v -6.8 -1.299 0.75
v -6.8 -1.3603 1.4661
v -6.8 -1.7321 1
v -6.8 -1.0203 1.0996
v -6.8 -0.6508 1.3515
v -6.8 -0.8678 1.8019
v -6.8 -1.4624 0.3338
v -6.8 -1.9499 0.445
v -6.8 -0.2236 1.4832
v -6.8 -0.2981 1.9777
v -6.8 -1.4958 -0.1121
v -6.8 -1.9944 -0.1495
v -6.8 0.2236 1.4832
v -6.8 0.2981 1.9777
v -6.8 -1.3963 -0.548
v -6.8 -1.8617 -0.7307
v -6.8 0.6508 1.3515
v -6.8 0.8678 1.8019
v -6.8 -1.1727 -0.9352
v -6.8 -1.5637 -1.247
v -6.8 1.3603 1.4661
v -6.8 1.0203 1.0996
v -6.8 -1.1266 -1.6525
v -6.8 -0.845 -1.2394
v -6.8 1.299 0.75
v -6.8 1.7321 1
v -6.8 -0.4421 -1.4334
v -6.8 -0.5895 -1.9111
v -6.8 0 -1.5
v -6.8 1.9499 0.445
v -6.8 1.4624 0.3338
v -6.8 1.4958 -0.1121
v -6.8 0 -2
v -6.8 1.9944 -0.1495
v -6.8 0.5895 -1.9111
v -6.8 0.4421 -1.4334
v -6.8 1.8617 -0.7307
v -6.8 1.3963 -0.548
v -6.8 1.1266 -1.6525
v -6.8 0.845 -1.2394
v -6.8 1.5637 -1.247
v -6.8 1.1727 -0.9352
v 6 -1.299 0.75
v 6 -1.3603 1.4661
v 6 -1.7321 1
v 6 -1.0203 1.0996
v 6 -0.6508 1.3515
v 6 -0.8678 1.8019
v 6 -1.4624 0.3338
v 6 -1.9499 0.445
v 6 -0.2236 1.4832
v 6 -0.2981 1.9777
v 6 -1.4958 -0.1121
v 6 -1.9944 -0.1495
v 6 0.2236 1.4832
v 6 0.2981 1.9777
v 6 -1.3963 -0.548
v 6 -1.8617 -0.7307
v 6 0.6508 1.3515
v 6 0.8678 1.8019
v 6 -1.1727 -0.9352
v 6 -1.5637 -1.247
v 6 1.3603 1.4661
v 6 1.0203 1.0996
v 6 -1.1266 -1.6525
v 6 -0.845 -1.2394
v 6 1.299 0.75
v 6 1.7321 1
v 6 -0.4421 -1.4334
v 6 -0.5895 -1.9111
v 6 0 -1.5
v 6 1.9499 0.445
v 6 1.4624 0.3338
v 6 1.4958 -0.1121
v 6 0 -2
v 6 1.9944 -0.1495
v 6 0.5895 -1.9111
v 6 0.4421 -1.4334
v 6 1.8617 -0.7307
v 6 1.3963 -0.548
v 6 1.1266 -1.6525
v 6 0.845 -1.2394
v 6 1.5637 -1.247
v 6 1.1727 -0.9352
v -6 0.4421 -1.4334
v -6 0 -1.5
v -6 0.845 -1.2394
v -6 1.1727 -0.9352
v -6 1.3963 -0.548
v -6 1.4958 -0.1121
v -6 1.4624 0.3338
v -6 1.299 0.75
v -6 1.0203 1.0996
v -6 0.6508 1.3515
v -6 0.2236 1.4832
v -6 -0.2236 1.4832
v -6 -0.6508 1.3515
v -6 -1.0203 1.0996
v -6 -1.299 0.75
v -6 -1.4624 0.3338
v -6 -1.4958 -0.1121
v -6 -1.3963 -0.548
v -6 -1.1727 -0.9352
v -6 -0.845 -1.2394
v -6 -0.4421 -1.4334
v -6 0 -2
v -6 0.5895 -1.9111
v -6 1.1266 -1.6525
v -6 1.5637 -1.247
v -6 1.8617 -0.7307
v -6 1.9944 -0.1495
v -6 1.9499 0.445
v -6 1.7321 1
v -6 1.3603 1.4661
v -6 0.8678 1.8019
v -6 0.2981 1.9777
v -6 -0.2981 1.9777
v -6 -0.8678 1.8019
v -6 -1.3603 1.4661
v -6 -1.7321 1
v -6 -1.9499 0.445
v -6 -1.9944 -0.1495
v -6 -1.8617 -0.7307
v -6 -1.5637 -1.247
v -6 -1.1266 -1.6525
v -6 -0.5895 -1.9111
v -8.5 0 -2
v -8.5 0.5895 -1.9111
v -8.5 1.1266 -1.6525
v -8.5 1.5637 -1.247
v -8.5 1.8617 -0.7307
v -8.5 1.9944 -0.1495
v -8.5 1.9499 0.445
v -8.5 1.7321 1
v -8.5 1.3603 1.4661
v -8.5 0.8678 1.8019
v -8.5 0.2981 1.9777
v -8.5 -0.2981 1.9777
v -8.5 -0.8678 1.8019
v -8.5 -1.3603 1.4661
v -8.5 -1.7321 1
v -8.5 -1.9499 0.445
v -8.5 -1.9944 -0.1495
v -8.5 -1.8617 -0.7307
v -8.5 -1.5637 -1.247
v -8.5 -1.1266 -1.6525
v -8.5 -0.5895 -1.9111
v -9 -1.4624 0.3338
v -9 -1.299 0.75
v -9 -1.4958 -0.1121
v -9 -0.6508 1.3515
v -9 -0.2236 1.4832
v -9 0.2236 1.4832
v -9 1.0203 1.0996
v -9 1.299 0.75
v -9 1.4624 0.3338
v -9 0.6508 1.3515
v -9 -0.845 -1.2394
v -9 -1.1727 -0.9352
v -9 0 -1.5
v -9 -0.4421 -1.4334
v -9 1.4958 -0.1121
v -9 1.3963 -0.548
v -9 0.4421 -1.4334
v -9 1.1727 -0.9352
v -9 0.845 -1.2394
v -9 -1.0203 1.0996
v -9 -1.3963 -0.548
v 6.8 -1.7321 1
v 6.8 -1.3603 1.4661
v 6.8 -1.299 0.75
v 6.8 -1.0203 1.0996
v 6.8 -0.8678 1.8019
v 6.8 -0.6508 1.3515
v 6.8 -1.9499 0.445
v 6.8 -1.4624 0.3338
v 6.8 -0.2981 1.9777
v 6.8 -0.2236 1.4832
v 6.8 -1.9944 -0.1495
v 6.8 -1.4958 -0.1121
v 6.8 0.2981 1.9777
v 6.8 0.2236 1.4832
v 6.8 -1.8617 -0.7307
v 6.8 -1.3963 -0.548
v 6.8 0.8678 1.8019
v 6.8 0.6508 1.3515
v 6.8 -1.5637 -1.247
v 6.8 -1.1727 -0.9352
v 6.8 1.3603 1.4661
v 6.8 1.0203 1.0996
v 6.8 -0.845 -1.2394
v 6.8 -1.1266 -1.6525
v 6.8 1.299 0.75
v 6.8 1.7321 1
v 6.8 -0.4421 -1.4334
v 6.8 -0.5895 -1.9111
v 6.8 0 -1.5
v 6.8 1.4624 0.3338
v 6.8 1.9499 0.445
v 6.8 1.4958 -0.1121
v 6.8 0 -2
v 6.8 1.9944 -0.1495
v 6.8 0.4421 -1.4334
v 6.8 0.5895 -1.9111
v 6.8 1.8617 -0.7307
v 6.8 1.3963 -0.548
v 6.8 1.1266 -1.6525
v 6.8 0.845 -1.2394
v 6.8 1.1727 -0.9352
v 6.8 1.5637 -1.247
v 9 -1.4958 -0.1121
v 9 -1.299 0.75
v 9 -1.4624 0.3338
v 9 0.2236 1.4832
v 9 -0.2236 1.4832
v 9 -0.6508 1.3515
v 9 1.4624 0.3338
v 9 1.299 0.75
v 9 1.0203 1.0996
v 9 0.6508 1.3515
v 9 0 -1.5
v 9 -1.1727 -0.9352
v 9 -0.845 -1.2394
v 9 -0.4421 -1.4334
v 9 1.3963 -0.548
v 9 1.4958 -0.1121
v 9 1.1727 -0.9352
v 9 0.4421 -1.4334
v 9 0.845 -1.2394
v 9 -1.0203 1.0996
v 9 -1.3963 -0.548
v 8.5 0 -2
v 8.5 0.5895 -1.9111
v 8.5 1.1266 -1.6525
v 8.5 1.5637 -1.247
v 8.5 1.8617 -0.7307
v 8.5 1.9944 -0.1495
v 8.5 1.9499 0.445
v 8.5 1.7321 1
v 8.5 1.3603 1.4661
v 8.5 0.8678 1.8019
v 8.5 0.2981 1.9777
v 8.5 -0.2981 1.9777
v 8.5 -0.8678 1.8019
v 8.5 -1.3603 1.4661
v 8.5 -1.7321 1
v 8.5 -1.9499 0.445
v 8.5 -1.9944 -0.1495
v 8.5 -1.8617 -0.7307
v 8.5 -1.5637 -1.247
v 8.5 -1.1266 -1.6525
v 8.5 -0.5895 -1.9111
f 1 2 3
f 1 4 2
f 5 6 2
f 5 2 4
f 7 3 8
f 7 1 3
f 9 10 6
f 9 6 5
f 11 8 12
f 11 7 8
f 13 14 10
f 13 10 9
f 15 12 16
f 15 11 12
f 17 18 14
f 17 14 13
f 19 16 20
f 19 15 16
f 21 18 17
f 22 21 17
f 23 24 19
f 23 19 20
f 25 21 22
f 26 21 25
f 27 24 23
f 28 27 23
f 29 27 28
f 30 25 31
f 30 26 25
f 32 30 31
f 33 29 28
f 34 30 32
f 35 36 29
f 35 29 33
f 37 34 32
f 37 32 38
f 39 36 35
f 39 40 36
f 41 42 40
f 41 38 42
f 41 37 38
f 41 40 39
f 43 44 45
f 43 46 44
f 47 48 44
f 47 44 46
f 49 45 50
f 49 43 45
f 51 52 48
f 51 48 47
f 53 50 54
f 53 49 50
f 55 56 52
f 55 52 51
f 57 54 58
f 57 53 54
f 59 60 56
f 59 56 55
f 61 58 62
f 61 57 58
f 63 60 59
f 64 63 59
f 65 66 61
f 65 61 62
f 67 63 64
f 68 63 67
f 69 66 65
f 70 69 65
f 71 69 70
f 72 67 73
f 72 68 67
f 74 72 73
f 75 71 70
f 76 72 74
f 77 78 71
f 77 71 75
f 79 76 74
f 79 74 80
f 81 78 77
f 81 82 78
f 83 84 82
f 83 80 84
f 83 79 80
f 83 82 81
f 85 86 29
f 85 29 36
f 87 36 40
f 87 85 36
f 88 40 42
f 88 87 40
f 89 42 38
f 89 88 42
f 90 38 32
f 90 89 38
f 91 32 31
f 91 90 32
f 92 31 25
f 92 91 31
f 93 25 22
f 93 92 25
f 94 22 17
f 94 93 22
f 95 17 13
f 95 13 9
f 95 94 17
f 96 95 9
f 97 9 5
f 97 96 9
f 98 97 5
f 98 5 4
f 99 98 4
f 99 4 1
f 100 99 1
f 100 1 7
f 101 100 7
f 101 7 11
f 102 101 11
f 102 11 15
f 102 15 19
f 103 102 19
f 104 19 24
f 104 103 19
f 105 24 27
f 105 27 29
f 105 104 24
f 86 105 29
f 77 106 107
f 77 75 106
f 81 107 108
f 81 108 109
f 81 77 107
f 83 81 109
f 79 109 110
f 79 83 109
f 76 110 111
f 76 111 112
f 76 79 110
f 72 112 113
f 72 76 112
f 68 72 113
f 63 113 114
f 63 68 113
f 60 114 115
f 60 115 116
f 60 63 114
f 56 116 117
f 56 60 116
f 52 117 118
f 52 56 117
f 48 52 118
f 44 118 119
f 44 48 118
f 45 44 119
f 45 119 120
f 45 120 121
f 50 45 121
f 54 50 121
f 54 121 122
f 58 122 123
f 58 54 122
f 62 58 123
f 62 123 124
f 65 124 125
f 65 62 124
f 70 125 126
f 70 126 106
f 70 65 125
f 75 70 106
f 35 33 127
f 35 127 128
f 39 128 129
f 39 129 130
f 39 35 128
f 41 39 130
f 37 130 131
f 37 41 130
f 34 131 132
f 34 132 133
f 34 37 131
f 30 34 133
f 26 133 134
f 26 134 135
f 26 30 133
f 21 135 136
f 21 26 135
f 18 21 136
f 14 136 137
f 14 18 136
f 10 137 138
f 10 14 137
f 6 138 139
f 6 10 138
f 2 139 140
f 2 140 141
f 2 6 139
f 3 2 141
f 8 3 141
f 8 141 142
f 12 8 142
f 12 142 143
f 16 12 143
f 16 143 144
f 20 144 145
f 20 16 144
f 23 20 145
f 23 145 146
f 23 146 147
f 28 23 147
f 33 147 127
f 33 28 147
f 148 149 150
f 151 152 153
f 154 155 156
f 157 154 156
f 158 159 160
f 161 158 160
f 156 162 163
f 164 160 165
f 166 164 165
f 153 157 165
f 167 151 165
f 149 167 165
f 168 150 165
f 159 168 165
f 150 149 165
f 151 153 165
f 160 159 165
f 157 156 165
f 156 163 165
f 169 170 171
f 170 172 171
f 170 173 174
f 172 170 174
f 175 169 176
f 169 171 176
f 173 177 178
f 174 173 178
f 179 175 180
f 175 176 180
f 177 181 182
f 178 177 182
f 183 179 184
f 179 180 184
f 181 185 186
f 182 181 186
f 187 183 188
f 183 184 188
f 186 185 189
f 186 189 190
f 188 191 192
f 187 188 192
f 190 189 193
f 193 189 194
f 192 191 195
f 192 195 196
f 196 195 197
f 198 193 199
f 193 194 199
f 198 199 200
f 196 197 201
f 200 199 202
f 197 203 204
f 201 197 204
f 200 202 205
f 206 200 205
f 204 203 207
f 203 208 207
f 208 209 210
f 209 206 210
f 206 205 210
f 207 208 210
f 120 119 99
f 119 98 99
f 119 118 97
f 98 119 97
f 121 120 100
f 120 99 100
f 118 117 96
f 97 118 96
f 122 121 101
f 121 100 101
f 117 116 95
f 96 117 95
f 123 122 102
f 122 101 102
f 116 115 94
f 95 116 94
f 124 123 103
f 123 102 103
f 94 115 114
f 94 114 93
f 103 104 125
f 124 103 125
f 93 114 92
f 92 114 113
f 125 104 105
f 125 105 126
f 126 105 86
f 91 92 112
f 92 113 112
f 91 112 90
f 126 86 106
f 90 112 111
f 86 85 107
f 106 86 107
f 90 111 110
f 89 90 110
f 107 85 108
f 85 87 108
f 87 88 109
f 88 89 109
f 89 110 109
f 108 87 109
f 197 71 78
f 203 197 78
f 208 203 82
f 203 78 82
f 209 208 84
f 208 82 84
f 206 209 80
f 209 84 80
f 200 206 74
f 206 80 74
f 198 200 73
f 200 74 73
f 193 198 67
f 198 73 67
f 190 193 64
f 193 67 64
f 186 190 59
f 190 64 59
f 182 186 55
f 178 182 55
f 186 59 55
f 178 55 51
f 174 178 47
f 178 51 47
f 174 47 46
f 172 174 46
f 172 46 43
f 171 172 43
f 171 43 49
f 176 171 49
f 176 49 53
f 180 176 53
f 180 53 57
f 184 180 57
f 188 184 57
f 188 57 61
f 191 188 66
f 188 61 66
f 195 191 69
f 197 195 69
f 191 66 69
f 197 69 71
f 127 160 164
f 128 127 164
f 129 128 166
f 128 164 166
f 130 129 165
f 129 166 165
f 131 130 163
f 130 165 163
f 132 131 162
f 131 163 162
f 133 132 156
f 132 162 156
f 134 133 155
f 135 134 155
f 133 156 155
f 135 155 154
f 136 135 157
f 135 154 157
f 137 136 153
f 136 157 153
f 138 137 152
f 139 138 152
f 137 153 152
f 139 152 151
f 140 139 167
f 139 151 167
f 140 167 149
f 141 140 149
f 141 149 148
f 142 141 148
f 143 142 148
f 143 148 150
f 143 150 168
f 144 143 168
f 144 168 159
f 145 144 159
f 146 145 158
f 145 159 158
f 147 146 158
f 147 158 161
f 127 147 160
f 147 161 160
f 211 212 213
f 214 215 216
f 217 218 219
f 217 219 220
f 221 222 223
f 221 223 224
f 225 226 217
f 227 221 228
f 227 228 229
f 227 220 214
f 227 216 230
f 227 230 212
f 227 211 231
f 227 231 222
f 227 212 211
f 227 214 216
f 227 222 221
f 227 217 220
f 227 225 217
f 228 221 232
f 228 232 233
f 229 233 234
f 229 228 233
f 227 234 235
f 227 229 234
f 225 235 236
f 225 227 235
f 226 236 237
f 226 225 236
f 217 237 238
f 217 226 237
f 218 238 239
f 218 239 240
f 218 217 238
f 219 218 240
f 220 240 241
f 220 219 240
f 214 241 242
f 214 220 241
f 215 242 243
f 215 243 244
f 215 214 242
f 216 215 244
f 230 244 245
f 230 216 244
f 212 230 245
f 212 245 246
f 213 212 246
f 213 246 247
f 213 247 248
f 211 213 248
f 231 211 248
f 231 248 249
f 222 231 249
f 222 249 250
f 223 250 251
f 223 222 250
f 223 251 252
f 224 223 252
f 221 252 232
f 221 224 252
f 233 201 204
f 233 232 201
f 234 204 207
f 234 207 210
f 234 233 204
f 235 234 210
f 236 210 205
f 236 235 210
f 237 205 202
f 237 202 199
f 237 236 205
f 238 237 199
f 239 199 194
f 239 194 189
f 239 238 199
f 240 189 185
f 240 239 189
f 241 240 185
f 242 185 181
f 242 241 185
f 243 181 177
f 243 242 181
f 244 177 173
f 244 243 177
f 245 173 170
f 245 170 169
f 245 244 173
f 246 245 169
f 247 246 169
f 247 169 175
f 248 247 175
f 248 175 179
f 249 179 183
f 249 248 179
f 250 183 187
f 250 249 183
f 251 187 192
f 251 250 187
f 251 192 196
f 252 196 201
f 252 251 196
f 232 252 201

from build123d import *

# Parameters (mm, degrees)
SKETCH1_R           = 2
BOSS_EXTRUDE1_DEPTH = 9
CHAMFER1_SIZE       = 0.5
CUT_EXTRUDE1_START  = -3
SKETCH2_R           = 2
SKETCH2_R_2         = 1.5
CUT_EXTRUDE1_DEPTH  = 0.8


with BuildPart() as part:
    # Sketch1 → Boss-Extrude1 (new body, symmetric)
    with BuildSketch(Plane(origin=(0, 0, 0), x_dir=(0, 0, -1), z_dir=(1, 0, 0))):
        Circle(SKETCH1_R)
    extrude(amount=BOSS_EXTRUDE1_DEPTH, both=True)

    # Chamfer1
    chamfer1_edges = [part.edges().sort_by_distance(p)[0] for p in [
        (-9, 0, 2),
        (9, 0, 2),
    ]]
    chamfer(chamfer1_edges, length=CHAMFER1_SIZE)

    # Sketch2 → Cut-Extrude1 (cut)
    with BuildSketch(Plane(origin=(9, 0, 0), x_dir=(0, 0, -1), z_dir=(1, 0, 0)).offset(CUT_EXTRUDE1_START)):
        Circle(SKETCH2_R)
        Circle(SKETCH2_R_2, mode=Mode.SUBTRACT)
    cut_extrude1 = extrude(amount=CUT_EXTRUDE1_DEPTH, mode=Mode.SUBTRACT)

    # Mirror1: Cut-Extrude1 across plane
    add(cut_extrude1.mirror(Plane(origin=(0, 0, 0), x_dir=(0, 0, 1), z_dir=(1, 0, 0))), mode=Mode.SUBTRACT)


solid = part.part
